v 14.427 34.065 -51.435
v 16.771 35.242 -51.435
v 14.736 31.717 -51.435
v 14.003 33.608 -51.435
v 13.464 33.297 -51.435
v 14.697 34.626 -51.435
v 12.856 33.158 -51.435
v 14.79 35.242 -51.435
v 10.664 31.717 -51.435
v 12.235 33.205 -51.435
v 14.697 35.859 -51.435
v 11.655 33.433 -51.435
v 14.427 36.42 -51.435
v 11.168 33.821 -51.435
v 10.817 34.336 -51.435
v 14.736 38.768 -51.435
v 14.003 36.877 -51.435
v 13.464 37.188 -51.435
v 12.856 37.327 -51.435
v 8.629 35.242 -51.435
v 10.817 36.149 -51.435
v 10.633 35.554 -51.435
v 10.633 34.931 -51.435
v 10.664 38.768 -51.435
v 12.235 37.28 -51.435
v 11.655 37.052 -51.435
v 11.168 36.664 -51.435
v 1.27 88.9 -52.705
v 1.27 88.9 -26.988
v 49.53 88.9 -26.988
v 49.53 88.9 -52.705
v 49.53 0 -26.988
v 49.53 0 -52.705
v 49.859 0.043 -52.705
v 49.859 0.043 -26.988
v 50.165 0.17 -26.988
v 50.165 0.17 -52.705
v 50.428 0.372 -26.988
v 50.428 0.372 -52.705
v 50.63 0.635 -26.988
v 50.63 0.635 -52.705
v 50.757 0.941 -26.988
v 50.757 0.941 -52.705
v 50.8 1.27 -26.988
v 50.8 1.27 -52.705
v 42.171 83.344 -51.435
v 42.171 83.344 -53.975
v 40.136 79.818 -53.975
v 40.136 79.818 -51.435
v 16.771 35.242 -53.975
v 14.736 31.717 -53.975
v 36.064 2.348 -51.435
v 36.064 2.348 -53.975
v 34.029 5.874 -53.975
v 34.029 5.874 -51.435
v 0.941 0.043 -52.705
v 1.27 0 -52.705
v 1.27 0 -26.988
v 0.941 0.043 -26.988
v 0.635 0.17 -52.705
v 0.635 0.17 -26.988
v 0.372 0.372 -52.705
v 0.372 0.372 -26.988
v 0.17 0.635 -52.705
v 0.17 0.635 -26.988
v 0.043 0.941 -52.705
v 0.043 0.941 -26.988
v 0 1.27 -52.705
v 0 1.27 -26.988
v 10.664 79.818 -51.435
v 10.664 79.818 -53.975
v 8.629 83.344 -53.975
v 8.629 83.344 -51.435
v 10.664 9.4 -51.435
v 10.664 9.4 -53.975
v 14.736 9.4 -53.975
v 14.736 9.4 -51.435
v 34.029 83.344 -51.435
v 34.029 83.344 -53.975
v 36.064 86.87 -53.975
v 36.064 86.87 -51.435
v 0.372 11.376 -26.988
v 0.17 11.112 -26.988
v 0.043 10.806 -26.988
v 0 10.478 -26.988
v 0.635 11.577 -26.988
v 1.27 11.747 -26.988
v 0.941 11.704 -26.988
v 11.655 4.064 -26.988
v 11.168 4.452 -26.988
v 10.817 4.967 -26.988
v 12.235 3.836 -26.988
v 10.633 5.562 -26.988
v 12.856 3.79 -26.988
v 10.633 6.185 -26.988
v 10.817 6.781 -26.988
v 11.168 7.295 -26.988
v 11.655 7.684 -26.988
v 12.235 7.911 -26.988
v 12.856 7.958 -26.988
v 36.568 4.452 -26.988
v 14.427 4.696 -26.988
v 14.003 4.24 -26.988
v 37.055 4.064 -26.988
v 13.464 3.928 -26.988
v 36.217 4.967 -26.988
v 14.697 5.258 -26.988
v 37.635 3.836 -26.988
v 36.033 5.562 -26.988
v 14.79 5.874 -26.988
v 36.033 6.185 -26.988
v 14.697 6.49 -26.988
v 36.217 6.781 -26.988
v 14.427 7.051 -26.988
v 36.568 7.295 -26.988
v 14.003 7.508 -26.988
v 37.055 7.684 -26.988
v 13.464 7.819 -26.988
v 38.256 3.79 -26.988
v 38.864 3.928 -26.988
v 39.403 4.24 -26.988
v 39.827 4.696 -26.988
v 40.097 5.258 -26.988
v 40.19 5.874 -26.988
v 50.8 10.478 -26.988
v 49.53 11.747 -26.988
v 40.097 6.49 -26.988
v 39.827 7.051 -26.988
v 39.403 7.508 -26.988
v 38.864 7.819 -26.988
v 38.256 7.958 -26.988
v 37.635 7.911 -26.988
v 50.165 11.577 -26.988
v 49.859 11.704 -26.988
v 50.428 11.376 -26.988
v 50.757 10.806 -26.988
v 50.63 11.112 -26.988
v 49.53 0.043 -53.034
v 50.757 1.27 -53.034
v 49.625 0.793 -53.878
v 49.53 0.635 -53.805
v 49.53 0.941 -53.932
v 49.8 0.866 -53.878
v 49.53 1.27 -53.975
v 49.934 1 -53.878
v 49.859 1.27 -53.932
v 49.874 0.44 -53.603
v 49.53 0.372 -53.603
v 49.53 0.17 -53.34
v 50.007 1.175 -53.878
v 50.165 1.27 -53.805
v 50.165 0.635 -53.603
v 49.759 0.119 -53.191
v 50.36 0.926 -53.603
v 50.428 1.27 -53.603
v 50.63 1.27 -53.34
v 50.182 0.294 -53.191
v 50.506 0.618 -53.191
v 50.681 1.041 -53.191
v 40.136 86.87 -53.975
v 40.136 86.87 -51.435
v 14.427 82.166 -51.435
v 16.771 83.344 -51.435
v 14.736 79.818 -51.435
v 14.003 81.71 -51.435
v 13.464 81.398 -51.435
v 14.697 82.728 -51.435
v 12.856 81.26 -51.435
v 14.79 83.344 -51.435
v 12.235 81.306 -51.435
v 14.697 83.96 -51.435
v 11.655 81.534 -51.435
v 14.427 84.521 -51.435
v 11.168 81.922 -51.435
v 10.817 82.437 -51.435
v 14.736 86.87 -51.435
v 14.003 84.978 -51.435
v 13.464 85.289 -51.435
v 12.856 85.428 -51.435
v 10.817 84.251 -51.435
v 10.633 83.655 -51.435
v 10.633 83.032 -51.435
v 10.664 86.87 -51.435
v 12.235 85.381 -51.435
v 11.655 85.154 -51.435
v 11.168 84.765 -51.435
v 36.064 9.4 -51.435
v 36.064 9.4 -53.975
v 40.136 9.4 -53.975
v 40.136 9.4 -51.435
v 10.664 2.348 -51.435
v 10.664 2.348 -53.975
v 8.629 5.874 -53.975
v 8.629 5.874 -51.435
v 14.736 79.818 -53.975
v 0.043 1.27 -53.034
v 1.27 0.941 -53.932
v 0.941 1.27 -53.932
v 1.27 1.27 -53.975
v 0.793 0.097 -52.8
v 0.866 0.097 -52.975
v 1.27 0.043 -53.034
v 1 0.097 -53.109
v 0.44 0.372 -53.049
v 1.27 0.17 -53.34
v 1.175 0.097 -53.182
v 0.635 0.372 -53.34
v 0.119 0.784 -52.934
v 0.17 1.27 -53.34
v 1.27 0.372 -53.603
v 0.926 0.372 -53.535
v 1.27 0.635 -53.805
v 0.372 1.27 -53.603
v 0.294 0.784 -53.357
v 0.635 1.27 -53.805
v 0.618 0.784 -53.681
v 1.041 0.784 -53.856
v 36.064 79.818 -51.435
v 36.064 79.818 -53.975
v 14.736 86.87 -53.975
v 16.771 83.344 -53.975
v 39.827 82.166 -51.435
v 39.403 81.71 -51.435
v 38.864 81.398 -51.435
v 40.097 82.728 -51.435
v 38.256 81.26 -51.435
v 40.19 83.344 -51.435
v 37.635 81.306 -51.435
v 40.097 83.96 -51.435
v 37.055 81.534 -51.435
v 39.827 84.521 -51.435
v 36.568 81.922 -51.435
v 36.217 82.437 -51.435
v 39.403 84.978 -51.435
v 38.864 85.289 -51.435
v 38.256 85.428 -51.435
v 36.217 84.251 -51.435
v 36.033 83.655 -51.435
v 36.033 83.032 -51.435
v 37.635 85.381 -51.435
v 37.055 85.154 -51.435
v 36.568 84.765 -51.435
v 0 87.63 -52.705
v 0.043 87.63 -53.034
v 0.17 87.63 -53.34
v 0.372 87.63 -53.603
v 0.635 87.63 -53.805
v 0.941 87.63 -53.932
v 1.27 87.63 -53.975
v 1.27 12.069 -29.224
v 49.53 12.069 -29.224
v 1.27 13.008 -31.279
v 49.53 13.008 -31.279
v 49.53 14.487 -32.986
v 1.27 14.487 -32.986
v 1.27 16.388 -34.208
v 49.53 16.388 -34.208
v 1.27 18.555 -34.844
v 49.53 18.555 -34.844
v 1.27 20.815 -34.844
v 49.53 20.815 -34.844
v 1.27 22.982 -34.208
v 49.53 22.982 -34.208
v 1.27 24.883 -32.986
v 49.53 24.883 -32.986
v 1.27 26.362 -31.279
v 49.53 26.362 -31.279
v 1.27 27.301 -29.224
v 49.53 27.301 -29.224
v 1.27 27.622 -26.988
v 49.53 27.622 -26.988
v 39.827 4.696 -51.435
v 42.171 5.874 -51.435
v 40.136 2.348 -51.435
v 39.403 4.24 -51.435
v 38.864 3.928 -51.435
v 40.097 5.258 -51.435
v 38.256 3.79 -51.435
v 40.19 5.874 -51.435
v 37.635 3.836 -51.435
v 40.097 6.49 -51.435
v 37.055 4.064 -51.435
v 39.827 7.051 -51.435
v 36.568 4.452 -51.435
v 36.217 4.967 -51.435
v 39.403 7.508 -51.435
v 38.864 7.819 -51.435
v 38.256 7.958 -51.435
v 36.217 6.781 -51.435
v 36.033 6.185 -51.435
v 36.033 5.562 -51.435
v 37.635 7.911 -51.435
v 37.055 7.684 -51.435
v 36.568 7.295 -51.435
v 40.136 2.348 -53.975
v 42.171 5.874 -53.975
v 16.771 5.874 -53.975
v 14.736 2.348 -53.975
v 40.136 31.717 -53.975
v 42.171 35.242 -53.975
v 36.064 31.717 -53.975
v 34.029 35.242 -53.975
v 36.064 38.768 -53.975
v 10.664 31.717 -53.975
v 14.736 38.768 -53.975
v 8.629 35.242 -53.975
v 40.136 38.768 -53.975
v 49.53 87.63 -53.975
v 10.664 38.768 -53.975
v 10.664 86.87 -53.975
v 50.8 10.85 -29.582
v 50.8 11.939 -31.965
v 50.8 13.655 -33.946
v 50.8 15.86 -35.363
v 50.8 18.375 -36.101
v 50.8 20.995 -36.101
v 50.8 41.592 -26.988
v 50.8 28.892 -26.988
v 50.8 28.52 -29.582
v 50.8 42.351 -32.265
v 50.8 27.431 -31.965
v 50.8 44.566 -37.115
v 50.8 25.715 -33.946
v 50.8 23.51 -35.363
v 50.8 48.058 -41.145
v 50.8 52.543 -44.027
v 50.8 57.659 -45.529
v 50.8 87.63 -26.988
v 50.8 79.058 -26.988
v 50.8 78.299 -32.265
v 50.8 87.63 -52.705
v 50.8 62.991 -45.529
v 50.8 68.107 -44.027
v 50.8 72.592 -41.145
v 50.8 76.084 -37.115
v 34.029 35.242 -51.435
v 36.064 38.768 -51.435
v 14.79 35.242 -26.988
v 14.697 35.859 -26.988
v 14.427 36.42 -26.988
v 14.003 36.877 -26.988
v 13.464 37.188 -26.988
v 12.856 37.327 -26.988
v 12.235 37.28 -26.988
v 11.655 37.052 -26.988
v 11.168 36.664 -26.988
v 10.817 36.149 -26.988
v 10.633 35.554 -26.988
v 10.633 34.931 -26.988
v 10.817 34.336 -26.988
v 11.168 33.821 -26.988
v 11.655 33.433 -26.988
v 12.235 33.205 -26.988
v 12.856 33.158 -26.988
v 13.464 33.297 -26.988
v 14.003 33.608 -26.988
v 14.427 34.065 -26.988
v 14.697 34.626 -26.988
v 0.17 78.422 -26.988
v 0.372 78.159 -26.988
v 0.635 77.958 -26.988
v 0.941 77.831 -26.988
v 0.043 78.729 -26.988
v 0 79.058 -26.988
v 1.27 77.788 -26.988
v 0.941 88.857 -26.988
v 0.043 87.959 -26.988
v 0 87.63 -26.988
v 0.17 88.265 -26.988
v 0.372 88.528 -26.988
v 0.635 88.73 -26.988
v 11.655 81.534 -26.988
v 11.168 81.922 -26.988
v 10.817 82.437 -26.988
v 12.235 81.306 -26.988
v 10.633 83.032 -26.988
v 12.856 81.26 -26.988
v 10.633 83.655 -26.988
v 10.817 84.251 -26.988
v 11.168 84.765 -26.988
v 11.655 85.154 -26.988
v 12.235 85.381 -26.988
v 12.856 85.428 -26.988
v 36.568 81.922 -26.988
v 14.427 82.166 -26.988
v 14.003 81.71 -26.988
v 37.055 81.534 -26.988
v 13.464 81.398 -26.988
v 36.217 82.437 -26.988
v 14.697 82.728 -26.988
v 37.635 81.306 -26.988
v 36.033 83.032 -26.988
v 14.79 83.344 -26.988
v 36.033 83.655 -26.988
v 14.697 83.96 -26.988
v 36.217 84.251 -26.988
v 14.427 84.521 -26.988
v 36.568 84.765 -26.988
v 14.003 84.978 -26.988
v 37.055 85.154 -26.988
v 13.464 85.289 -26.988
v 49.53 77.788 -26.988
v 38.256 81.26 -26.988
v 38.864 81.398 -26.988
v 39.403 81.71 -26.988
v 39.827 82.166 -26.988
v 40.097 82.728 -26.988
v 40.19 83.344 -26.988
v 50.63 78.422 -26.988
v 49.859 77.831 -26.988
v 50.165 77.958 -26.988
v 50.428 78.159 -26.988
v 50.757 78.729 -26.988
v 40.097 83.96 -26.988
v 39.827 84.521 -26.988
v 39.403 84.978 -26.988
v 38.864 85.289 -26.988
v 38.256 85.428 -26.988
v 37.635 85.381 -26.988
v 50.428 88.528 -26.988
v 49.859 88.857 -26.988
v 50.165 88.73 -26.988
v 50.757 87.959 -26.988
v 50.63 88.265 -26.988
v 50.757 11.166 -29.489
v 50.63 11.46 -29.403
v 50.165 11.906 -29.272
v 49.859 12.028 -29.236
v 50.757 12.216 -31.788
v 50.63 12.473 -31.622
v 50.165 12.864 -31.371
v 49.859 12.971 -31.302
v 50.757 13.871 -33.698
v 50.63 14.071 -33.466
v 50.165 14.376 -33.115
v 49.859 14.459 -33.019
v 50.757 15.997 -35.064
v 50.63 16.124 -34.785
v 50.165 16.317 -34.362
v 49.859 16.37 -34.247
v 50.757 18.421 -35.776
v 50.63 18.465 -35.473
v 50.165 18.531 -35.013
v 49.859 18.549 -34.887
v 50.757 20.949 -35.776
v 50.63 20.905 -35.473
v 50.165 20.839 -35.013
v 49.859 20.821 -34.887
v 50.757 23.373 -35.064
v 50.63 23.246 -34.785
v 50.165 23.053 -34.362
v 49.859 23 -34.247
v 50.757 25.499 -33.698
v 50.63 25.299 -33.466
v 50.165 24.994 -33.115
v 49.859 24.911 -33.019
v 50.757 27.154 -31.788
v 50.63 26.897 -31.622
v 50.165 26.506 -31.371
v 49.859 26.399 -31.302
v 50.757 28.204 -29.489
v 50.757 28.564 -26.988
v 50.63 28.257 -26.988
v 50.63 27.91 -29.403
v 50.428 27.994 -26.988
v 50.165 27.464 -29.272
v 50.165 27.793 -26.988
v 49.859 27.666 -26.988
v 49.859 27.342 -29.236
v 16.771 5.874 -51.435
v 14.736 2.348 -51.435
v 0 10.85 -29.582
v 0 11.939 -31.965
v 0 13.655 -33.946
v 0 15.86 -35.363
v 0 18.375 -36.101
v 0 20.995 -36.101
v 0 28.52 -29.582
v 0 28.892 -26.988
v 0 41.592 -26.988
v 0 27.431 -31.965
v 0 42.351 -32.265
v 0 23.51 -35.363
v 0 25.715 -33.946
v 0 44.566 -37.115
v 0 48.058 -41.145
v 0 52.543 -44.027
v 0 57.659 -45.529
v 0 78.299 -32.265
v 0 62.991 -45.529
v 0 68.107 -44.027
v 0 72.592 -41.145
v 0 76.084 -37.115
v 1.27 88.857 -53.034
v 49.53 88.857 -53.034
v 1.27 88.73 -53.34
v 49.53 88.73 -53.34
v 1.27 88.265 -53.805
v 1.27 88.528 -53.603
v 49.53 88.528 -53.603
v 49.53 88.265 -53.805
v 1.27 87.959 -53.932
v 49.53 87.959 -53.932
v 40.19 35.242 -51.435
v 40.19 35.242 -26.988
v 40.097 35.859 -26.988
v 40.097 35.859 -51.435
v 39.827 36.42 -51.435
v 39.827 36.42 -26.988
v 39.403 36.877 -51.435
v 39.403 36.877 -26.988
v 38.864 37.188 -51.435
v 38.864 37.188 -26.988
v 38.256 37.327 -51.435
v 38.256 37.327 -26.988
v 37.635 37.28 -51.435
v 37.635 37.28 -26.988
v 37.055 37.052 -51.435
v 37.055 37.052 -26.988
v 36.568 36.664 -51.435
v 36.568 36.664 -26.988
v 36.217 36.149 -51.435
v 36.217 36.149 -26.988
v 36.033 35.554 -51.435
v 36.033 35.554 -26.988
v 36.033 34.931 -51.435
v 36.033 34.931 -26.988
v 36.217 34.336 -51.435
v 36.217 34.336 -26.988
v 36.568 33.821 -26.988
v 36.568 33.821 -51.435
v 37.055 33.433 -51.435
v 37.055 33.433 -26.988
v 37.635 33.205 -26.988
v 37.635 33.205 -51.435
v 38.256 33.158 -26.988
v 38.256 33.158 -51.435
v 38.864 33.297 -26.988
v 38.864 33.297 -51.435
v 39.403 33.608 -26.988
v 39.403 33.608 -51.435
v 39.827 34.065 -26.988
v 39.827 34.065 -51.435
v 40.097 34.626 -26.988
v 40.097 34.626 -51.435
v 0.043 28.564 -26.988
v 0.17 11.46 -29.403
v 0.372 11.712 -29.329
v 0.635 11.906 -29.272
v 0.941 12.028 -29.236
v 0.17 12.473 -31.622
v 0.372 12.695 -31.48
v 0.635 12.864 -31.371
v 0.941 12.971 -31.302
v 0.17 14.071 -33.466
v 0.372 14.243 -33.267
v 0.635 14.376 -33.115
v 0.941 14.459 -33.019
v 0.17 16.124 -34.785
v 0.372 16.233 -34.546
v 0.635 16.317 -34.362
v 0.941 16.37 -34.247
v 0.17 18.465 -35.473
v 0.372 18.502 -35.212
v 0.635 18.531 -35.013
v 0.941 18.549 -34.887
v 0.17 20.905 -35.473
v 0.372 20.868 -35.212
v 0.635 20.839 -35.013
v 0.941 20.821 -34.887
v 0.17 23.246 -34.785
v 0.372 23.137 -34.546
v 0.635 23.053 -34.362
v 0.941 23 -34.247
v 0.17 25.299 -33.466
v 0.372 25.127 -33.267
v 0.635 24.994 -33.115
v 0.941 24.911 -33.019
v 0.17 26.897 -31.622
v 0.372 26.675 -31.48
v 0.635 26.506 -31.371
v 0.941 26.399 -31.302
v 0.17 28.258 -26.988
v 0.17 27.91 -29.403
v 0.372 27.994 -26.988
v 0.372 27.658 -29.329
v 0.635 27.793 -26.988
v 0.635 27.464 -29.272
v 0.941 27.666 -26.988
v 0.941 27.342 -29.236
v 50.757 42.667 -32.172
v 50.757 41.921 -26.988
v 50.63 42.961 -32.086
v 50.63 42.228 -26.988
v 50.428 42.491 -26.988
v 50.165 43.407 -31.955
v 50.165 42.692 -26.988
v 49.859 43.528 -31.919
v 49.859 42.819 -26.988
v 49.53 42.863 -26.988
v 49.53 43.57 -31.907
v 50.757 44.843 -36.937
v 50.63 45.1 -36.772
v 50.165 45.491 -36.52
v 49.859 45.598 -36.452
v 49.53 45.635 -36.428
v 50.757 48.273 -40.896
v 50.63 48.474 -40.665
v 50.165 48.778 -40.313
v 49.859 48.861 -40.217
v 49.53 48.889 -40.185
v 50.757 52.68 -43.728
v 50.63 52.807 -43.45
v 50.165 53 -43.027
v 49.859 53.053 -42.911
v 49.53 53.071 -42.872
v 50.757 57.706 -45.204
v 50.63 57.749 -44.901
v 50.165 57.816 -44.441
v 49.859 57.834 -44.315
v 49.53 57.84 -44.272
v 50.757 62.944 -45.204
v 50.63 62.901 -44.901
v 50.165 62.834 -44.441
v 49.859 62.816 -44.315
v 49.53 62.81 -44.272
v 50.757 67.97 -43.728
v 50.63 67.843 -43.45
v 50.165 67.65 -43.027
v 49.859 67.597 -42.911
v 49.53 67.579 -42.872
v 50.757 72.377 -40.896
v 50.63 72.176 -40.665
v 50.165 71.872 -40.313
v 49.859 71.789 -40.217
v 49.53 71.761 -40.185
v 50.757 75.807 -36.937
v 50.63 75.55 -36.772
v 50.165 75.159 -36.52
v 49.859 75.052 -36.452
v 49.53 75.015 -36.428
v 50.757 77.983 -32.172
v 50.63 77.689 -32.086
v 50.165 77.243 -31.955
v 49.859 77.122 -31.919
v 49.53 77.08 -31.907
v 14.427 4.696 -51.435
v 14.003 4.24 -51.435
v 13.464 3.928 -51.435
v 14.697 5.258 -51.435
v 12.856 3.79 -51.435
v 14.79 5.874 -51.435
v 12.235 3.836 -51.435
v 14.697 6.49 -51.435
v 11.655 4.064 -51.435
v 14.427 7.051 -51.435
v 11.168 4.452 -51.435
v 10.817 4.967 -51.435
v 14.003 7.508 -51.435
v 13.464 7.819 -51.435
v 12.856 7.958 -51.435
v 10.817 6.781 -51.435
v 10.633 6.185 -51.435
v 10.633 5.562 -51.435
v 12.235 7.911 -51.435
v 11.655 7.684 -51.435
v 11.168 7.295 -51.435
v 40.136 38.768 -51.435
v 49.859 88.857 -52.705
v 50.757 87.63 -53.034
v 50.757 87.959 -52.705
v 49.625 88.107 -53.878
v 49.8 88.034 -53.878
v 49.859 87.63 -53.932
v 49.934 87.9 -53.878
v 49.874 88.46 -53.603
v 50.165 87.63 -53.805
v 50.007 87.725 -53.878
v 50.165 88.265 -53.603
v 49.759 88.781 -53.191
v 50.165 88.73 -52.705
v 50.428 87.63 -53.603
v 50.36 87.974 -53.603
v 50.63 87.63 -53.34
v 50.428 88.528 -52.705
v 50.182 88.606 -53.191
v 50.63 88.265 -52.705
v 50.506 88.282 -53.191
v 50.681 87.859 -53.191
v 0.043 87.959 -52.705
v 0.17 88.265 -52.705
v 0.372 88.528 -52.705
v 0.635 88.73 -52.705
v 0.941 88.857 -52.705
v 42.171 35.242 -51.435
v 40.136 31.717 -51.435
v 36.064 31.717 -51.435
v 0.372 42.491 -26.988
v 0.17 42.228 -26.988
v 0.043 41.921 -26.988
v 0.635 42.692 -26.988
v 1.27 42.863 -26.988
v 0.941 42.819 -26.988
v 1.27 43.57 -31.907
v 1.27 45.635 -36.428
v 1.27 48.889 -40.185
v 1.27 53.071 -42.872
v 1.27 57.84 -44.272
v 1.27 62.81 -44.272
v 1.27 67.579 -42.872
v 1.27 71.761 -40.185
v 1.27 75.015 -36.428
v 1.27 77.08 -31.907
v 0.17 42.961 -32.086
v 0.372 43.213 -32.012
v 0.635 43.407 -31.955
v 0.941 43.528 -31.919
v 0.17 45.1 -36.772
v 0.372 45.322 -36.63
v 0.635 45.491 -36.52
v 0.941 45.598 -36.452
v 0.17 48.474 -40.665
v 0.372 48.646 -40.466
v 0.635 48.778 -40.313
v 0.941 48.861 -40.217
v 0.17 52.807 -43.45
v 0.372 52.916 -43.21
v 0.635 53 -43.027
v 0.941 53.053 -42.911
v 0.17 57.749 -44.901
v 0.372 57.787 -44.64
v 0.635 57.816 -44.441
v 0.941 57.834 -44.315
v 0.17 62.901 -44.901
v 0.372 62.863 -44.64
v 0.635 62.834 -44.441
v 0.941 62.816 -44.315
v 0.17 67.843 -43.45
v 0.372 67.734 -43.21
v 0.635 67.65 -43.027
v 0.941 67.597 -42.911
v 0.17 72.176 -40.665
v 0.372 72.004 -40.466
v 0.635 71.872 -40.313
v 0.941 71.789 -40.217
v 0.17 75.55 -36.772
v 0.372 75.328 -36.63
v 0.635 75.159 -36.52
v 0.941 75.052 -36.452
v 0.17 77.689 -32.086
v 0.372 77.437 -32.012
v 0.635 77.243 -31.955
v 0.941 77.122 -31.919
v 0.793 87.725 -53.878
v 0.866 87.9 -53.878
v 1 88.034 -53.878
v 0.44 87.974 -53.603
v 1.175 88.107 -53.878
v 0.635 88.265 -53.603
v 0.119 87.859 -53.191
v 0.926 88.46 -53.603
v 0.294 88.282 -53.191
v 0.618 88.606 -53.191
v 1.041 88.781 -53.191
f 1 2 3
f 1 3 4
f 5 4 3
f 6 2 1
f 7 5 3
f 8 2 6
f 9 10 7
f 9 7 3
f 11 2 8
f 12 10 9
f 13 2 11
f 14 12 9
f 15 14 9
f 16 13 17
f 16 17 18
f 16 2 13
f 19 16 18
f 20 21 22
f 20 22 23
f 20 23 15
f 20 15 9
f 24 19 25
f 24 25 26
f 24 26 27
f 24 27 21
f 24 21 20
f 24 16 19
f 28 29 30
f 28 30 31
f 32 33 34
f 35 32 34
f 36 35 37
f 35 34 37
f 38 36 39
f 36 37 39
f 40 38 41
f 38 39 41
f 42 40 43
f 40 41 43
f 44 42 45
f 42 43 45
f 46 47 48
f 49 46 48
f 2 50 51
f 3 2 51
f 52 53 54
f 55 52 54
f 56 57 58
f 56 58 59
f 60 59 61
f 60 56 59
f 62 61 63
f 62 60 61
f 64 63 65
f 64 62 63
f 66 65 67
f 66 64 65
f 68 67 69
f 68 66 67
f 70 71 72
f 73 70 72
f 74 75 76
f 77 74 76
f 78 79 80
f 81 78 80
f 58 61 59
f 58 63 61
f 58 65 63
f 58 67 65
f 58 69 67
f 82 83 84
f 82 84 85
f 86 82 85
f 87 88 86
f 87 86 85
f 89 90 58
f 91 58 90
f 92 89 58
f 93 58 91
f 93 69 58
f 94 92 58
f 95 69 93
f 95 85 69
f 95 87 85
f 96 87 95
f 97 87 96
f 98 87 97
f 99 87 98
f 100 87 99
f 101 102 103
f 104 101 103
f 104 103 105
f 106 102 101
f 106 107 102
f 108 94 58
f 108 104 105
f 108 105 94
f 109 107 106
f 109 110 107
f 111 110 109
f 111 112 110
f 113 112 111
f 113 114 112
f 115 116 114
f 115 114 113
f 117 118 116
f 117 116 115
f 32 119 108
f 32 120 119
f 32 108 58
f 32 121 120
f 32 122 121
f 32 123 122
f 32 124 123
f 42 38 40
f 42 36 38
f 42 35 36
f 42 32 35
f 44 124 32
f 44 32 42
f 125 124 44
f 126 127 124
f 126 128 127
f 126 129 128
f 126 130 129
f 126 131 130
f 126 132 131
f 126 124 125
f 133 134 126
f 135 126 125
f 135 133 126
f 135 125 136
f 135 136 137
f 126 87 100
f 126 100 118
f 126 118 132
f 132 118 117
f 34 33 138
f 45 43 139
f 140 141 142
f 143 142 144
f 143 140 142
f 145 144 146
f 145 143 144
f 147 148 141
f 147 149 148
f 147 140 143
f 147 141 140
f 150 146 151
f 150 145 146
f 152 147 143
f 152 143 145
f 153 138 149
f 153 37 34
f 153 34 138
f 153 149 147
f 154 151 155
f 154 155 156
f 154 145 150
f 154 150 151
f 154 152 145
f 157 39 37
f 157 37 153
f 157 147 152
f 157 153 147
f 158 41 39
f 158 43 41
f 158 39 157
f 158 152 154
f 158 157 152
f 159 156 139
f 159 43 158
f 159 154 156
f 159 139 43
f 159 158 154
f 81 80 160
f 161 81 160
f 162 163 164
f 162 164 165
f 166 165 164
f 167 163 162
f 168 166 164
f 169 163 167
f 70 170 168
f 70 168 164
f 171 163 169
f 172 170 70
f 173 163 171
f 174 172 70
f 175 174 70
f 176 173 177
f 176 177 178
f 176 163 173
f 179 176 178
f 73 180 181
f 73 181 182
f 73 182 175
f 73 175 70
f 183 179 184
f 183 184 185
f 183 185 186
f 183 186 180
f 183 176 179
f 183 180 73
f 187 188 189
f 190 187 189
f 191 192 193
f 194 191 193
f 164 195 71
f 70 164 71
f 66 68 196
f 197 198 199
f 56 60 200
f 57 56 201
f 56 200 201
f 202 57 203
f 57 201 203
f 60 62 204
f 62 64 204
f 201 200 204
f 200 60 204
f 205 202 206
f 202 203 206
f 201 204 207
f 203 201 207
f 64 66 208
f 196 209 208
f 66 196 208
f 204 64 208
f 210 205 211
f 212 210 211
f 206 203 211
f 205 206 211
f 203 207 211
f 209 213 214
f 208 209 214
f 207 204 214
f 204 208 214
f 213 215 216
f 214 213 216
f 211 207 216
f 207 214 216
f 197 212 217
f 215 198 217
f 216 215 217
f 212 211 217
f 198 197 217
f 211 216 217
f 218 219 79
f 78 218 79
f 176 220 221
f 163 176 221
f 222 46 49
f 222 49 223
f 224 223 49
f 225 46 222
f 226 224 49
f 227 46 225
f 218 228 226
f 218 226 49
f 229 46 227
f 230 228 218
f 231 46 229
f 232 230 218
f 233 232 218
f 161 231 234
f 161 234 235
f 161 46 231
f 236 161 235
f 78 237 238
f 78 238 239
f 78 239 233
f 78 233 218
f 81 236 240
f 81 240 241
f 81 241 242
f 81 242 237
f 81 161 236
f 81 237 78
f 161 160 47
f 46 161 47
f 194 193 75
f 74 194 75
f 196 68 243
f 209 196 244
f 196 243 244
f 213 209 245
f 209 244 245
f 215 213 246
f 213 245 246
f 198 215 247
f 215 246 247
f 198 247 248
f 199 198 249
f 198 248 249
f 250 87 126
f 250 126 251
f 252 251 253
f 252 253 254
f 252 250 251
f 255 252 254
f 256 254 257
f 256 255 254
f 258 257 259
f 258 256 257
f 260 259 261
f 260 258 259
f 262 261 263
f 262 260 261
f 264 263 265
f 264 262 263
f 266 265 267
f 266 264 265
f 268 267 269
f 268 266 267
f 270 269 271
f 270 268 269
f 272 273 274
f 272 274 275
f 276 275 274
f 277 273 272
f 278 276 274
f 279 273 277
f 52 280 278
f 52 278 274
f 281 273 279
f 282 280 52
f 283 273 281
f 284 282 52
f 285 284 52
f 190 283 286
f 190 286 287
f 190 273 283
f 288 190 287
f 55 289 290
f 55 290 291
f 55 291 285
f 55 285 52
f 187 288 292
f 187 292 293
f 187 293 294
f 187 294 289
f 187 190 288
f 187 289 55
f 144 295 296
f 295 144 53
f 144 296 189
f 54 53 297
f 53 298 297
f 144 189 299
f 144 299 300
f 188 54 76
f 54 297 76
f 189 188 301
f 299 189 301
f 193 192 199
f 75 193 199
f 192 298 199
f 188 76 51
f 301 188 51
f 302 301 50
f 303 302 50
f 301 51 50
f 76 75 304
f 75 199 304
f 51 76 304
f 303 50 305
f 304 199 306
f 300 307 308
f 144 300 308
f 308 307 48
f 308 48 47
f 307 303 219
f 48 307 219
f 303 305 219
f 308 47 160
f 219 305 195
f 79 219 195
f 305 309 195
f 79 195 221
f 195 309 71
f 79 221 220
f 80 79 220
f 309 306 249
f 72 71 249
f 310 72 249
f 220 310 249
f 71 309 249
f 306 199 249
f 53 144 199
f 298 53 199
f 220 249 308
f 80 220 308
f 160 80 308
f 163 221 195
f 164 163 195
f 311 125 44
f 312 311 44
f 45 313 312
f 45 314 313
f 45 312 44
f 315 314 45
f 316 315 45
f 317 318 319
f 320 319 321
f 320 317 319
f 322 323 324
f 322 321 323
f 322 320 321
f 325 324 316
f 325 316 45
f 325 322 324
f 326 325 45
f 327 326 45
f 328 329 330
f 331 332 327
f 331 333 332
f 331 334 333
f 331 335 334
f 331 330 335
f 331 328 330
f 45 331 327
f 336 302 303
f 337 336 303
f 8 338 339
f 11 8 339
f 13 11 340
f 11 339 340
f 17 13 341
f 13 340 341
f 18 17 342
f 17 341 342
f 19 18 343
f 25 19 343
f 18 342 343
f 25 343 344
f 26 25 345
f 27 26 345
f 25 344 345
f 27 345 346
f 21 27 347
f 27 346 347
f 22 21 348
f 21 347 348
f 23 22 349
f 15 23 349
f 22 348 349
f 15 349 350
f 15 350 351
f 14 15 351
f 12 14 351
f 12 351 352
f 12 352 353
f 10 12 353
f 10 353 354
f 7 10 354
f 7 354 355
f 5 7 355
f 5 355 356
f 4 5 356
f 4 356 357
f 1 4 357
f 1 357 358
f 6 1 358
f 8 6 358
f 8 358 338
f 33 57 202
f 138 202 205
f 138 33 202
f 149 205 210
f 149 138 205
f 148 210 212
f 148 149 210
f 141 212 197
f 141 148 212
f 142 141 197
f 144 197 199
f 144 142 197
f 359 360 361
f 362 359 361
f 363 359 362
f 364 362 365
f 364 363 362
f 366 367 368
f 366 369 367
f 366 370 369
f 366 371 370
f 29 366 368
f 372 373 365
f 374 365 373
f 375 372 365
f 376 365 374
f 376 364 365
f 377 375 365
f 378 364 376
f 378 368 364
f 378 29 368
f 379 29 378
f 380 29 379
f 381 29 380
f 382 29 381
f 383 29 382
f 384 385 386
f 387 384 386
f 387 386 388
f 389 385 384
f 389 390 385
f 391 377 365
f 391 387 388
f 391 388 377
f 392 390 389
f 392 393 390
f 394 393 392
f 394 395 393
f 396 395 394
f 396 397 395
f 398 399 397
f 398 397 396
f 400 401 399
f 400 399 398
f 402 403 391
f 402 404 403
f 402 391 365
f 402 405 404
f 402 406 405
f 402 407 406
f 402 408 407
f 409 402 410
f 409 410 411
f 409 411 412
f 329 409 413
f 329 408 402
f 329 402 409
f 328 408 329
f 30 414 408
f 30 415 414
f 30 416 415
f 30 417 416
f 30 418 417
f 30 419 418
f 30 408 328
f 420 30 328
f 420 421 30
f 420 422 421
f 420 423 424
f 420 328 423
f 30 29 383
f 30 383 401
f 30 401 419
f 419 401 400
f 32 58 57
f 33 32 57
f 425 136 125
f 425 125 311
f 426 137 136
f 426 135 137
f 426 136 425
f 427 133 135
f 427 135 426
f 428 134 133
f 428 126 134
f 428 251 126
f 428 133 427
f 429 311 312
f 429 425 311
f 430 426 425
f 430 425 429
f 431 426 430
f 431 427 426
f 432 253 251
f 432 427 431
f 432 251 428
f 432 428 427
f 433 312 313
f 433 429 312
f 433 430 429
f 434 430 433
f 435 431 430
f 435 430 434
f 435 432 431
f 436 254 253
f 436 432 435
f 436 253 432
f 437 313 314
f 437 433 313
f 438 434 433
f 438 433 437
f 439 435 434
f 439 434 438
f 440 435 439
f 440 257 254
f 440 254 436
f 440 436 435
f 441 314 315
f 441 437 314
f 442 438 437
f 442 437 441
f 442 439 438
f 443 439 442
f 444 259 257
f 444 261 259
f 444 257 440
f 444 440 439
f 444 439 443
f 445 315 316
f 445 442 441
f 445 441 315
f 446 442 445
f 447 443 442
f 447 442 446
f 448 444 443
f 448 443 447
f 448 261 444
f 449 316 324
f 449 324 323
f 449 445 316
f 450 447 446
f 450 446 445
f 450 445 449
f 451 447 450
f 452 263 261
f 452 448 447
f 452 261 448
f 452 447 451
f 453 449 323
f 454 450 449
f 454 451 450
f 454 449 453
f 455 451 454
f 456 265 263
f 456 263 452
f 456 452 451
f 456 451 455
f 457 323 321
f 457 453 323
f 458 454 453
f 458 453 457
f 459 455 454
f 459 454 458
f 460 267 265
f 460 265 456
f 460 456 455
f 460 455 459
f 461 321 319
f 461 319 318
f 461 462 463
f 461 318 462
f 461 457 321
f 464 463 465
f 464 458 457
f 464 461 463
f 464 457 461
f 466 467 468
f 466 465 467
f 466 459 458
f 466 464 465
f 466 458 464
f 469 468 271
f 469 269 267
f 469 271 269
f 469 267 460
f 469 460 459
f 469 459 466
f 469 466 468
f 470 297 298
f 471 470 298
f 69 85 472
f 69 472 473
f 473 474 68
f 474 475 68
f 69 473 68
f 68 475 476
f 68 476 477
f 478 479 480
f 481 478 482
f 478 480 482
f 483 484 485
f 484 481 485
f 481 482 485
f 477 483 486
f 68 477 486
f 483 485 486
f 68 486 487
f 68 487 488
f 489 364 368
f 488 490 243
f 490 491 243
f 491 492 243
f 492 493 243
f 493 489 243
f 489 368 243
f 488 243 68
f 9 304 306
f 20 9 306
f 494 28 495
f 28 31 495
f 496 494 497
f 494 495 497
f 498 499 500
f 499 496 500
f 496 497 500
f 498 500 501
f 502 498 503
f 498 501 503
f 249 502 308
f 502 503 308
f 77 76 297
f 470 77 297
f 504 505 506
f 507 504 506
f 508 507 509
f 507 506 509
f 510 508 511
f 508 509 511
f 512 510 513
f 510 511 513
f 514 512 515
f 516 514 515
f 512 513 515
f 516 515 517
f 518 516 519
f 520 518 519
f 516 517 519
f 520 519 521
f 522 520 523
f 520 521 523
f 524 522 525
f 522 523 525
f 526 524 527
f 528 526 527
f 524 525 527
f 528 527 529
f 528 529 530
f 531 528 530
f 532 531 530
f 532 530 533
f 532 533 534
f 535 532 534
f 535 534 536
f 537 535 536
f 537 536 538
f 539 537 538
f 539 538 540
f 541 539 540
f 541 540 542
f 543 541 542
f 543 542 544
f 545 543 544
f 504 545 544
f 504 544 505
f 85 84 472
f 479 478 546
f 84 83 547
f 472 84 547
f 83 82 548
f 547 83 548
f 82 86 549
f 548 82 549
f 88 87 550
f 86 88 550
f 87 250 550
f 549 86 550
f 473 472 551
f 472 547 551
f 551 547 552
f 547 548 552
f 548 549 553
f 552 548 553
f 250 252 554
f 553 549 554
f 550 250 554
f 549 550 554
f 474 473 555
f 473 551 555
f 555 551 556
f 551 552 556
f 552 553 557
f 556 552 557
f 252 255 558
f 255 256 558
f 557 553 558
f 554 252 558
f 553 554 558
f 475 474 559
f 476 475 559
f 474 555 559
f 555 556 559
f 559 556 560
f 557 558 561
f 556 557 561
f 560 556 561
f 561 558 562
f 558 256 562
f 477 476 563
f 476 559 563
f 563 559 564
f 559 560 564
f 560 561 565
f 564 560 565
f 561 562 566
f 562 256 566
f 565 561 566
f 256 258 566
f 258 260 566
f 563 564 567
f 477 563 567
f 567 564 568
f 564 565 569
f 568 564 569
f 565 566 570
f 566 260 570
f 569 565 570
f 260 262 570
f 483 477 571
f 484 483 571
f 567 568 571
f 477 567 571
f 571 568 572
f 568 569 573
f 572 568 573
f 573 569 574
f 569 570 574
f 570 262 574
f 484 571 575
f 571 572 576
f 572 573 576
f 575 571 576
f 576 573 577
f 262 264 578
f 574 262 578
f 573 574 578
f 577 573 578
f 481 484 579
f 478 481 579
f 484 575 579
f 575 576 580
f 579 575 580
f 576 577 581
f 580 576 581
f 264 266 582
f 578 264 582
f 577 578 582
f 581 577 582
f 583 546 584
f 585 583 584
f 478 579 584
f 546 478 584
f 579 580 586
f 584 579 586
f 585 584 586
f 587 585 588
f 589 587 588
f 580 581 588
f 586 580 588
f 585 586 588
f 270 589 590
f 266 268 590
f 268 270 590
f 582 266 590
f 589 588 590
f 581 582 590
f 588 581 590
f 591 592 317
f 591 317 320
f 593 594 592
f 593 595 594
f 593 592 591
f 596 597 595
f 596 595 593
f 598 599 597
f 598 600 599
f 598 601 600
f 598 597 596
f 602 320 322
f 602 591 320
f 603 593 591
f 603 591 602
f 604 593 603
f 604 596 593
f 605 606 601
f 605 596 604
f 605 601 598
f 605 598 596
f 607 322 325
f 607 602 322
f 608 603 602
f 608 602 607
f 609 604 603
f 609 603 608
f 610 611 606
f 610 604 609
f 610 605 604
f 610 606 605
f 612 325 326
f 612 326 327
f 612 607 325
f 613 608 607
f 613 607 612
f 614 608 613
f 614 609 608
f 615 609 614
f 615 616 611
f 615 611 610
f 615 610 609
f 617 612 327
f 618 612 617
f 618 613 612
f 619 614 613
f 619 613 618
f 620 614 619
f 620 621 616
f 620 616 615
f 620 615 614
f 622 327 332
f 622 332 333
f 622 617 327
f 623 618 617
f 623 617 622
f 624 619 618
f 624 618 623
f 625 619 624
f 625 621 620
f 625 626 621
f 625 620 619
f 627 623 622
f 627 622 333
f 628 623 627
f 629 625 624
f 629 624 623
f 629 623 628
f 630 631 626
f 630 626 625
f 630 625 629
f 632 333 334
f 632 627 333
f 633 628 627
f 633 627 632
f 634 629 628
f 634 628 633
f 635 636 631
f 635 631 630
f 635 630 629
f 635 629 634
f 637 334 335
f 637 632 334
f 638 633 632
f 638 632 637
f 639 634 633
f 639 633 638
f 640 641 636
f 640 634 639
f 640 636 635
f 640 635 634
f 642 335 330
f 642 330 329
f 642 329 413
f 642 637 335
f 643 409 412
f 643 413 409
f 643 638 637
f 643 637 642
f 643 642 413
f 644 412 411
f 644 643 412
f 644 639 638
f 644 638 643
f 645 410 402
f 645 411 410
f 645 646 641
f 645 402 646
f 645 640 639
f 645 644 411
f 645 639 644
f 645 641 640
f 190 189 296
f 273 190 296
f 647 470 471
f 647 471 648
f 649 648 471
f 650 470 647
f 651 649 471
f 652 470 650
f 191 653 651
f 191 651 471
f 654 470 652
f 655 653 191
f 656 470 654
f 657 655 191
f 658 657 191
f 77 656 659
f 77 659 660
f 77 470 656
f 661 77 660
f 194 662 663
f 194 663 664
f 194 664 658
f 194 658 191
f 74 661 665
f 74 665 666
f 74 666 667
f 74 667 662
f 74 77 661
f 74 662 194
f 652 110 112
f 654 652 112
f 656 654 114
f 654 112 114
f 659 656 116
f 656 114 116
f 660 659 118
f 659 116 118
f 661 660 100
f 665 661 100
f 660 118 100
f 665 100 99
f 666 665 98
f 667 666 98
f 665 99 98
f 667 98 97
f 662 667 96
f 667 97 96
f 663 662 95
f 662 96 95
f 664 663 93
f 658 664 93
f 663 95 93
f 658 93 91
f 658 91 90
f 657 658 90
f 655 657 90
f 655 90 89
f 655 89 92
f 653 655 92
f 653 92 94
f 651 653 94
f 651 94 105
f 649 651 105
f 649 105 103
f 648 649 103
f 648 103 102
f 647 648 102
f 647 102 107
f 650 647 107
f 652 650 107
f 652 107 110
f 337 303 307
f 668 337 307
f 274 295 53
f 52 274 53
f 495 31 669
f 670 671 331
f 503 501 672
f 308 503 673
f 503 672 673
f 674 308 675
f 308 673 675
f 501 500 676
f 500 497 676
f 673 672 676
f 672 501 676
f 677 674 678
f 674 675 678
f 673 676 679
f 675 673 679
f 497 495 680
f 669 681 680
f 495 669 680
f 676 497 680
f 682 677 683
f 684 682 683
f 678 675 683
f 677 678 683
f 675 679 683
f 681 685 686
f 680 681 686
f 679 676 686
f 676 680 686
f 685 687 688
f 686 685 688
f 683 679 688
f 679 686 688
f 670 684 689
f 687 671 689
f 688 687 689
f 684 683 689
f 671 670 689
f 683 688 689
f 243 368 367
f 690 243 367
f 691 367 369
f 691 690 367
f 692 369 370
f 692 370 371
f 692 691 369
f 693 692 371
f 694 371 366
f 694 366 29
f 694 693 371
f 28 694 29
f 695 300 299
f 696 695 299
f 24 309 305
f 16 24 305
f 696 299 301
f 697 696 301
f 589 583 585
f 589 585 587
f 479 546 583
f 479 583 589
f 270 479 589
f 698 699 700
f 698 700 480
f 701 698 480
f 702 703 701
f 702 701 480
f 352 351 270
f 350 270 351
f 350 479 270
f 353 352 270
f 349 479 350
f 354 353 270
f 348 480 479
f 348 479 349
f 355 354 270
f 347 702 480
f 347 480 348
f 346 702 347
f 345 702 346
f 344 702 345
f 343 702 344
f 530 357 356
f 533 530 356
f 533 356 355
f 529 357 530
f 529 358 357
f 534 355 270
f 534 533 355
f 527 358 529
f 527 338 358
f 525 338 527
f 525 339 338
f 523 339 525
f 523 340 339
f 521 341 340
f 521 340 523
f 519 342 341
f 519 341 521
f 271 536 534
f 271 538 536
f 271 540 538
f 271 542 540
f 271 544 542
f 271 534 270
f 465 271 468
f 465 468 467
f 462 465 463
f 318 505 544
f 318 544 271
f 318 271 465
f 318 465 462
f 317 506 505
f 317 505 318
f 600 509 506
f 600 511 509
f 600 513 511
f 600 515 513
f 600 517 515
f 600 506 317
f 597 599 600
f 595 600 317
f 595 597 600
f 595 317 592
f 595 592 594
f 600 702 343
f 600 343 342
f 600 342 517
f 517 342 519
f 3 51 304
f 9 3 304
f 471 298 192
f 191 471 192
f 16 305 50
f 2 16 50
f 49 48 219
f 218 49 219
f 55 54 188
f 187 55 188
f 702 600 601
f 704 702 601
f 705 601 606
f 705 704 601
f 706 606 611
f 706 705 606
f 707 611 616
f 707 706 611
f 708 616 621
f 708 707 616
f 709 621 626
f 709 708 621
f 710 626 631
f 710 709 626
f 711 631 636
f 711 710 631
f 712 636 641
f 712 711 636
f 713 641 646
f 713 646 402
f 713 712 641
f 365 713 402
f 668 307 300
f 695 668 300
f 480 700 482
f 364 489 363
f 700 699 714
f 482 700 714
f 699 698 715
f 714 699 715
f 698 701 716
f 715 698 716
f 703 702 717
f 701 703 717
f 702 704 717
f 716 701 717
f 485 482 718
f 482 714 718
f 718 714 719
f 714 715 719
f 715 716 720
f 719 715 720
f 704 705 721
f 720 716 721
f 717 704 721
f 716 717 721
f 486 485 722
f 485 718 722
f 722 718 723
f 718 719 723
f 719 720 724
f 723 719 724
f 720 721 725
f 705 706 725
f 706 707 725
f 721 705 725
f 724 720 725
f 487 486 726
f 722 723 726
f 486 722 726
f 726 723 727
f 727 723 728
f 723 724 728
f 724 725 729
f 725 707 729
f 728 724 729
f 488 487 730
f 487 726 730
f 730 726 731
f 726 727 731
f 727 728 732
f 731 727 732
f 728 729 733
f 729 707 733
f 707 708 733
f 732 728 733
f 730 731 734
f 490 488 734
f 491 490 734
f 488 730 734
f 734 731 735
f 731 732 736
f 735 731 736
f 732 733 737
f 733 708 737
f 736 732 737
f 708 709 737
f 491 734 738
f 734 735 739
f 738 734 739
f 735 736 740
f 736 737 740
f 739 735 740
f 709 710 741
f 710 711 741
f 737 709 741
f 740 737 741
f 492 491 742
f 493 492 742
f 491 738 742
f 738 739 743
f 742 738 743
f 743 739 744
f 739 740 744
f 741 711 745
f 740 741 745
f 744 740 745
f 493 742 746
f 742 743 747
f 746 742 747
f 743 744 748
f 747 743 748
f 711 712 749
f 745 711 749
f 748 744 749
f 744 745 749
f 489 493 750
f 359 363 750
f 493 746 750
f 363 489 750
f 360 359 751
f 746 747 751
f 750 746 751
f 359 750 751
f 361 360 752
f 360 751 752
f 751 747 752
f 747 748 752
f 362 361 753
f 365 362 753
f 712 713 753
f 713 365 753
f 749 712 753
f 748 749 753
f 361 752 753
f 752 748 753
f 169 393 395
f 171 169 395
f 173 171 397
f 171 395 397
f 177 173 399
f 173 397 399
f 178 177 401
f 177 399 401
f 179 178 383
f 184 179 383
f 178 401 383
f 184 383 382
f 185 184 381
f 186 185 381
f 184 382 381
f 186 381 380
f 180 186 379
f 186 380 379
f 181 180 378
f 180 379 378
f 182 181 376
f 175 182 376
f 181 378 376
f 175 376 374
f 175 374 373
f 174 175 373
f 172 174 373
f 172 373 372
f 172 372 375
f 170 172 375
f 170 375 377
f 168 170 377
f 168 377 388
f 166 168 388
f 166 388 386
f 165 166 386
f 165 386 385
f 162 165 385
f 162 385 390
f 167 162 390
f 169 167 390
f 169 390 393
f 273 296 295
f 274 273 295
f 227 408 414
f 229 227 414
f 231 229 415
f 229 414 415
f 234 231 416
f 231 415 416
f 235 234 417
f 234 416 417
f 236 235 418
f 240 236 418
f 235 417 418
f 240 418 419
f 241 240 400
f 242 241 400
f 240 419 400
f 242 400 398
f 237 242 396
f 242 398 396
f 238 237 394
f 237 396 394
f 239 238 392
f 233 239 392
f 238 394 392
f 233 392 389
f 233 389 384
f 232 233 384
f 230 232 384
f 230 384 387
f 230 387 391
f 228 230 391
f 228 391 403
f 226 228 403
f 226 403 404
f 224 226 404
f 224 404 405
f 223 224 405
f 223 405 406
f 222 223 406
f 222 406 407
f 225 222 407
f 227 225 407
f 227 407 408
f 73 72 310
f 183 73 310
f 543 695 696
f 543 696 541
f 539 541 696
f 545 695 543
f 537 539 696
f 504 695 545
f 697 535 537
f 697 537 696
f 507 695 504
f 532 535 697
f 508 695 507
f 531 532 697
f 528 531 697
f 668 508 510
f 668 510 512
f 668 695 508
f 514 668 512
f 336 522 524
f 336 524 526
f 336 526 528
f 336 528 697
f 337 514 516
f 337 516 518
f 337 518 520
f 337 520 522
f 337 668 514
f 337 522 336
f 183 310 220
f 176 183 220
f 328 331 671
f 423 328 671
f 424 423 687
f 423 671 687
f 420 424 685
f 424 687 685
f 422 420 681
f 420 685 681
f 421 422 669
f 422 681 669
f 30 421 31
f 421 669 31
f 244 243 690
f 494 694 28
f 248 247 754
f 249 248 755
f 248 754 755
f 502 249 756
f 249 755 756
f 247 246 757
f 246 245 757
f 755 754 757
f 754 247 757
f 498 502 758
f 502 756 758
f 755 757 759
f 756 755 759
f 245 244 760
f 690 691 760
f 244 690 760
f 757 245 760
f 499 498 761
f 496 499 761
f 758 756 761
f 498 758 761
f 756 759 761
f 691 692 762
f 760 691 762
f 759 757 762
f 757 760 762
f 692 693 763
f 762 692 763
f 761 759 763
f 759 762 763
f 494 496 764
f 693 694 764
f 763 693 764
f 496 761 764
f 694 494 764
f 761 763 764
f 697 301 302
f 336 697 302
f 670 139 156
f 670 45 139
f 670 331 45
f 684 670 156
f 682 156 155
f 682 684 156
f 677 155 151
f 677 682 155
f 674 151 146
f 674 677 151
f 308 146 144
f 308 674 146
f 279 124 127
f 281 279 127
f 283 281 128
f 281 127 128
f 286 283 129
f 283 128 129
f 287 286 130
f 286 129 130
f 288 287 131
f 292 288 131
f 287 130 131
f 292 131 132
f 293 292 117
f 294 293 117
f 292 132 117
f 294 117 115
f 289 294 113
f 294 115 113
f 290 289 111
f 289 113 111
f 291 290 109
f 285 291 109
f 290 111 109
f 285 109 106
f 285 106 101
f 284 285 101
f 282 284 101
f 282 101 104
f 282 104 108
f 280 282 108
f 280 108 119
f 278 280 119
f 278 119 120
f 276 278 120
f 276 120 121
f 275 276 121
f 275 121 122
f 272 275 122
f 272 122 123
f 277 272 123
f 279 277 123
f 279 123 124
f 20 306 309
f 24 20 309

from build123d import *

# Parameters (mm, degrees)
SKETCH1_W           = 53.975
SKETCH1_H           = 88.9
SKETCH1_R           = 7.9375
SKETCH1_R_2         = 17.4625
BOSS_EXTRUDE1_DEPTH = 50.8
SKETCH5_R           = 2.09
CUT_EXTRUDE1_DEPTH  = 116.746060948
SKETCH5_3_R         = 3.6
CUT_EXTRUDE2_DEPTH  = 4.064
CUT_EXTRUDE3_DEPTH  = 2.54
FILLET1_R           = 1.27


with BuildPart() as part:
    # Sketch1 → Boss-Extrude1 (new body)
    with BuildSketch(Plane(origin=(0, 0, 0), x_dir=(0, 0, -1), z_dir=(1, 0, 0))):
        with Locations((26.9875, 44.45)):
            Rectangle(SKETCH1_W, SKETCH1_H)
        with Locations(Location((26.9875, 19.685, 0), (0, 0, 180))):
            Circle(SKETCH1_R, mode=Mode.SUBTRACT)
        with Locations(Location((26.9875, 60.325, 0), (0, 0, 180))):
            Circle(SKETCH1_R_2, mode=Mode.SUBTRACT)
    extrude(amount=BOSS_EXTRUDE1_DEPTH)

    # Sketch5 → Cut-Extrude1 (cut, through all)
    with BuildSketch(Plane.XY):
        with Locations((12.7, 83.34375)):
            Circle(SKETCH5_R)
        with Locations((12.7, 35.2425)):
            Circle(SKETCH5_R)
        with Locations((38.1, 83.34375)):
            Circle(SKETCH5_R)
        with Locations((38.1, 35.2425)):
            Circle(SKETCH5_R)
        with Locations((12.7, 5.87375)):
            Circle(SKETCH5_R)
        with Locations((38.1, 5.87375)):
            Circle(SKETCH5_R)
    extrude(amount=-CUT_EXTRUDE1_DEPTH, mode=Mode.SUBTRACT)

    # Sketch5<3> → Cut-Extrude2 (cut)
    with BuildSketch(Plane.XY):
        with Locations((38.1, 35.2425)):
            Circle(SKETCH5_3_R)
        with Locations((12.7, 83.34375)):
            Circle(SKETCH5_3_R)
        with Locations((38.1, 83.34375)):
            Circle(SKETCH5_3_R)
        with Locations((12.7, 35.2425)):
            Circle(SKETCH5_3_R)
        with Locations((38.1, 5.87375)):
            Circle(SKETCH5_3_R)
        with Locations((12.7, 5.87375)):
            Circle(SKETCH5_3_R)
    extrude(amount=-CUT_EXTRUDE2_DEPTH, mode=Mode.SUBTRACT)

    # Sketch6 → Cut-Extrude3 (cut)
    with BuildSketch(Plane(origin=(0, 0, -53.975), x_dir=(-1, 0, 0), z_dir=(0, 0, -1))):
        Polygon((-34.02855, 83.34375), (-36.064275, 86.86972913), (-40.135725, 86.86972913), (-42.17145, 83.34375), (-40.135725, 79.81777087), (-36.064275, 79.81777087), align=None)
        Polygon((-8.62855, 83.34375), (-10.664275, 86.86972913), (-14.735725, 86.86972913), (-16.77145, 83.34375), (-14.735725, 79.81777087), (-10.664275, 79.81777087), align=None)
        Polygon((-8.62855, 35.2425), (-10.664275, 38.76847913), (-14.735725, 38.76847913), (-16.77145, 35.2425), (-14.735725, 31.71652087), (-10.664275, 31.71652087), align=None)
        Polygon((-34.02855, 35.2425), (-36.064275, 38.76847913), (-40.135725, 38.76847913), (-42.17145, 35.2425), (-40.135725, 31.71652087), (-36.064275, 31.71652087), align=None)
        Polygon((-34.02855, 5.87375), (-36.064275, 9.39972913), (-40.135725, 9.39972913), (-42.17145, 5.87375), (-40.135725, 2.34777087), (-36.064275, 2.34777087), align=None)
        Polygon((-8.62855, 5.87375), (-10.664275, 9.39972913), (-14.735725, 9.39972913), (-16.77145, 5.87375), (-14.735725, 2.34777087), (-10.664275, 2.34777087), align=None)
    extrude(amount=-CUT_EXTRUDE3_DEPTH, mode=Mode.SUBTRACT)

    # Fillet1
    fillet1_edges = [part.edges().sort_by_distance(p)[0] for p in [
        (0, 60.325, -44.45),
        (50.8, 60.325, -44.45),
        (50.8, 88.9, -26.9875),
        (0, 19.685, -34.925),
        (50.8, 19.685, -34.925),
        (50.8, 44.45, 0),
        (50.8, 0, -26.9875),
        (0, 44.45, 0),
        (0, 88.9, -26.9875),
        (0, 44.45, -53.975),
        (0, 0, -26.9875),
        (25.4, 0, 0),
        (25.4, 88.9, 0),
        (25.4, 88.9, -53.975),
        (25.4, 0, -53.975),
        (50.8, 44.45, -53.975),
    ]]
    fillet(fillet1_edges, radius=FILLET1_R)

    # SurfaceCut1
    split(bisect_by=Plane.XY.offset(-26.9875), keep=Keep.BOTTOM)


solid = part.part
